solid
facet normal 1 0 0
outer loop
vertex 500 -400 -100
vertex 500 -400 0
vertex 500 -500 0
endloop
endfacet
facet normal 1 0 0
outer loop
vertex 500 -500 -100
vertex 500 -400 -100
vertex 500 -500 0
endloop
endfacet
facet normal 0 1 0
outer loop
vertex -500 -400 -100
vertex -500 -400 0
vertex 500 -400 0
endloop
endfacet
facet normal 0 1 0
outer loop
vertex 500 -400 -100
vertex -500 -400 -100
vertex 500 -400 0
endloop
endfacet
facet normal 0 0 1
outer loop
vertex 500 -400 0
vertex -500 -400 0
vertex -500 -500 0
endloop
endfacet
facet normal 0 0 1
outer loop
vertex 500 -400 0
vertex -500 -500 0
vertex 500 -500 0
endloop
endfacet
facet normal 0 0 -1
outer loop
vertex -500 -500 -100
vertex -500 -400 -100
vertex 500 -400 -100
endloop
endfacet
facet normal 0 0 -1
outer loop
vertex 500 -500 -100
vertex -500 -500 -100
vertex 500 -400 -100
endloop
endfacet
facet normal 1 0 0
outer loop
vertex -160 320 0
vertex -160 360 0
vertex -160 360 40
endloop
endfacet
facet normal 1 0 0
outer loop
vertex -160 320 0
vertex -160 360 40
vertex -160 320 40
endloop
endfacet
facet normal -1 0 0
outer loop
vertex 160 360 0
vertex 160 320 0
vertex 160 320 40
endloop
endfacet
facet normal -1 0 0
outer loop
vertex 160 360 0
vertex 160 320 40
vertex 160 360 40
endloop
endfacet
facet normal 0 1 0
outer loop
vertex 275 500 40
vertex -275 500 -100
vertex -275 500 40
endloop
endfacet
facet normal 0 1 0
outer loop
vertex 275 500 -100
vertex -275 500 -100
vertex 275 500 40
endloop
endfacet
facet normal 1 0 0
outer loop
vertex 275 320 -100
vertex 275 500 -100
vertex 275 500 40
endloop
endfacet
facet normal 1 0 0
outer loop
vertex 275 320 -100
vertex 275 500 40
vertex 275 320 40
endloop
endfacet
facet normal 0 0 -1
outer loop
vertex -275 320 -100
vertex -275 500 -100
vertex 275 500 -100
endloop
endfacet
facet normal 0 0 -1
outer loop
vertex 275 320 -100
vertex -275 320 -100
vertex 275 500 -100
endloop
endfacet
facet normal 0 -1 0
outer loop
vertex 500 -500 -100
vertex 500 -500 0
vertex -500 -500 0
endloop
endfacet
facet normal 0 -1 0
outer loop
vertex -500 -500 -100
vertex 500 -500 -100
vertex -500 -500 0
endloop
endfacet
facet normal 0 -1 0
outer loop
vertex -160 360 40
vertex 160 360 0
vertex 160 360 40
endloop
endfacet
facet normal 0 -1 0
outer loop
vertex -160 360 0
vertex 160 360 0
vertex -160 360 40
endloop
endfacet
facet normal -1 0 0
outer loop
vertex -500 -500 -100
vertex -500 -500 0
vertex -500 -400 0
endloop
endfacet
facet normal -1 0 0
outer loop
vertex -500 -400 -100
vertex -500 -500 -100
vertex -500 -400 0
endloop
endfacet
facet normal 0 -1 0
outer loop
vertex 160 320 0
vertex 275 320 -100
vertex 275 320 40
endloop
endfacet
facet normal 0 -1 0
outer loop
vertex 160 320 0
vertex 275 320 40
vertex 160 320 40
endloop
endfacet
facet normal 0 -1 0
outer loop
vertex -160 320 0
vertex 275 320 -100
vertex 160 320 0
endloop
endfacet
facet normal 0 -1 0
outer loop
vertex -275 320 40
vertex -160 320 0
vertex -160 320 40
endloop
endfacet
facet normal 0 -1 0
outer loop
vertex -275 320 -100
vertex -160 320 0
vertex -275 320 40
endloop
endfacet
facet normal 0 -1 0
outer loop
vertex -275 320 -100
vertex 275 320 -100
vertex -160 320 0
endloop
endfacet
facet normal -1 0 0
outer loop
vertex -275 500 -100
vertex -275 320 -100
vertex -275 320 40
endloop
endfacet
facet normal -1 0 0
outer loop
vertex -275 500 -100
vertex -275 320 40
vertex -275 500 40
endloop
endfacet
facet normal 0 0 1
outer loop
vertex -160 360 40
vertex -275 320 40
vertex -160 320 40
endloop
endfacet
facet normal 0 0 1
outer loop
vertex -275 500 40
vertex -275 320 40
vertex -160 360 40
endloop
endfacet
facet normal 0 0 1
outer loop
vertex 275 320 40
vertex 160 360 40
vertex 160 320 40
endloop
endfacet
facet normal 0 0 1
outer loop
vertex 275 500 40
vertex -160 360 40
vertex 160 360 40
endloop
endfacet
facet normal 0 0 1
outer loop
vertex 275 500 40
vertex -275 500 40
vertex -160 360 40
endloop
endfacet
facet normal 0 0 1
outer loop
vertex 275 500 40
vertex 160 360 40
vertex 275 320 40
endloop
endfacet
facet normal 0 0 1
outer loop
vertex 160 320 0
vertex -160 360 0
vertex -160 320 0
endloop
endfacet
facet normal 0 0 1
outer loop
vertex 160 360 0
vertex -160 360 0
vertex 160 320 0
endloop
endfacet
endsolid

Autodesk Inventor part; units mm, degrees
ref_plane "YZ Plane" through (0, 0, 0) normal (1, 0, 0) x (0, 1, 0)
ref_plane "XZ Plane" through (0, 0, 0) normal (0, 1, 0) x (-1, 0, 0)
ref_plane "XY Plane" through (0, 0, 0) normal (0, 0, 1) x (1, 0, 0)
sketch "Skizze3" plane through (0, 0, 0) normal (0, 0, 1) x (1, 0, 0)
  line L0 (-500, 500) -> (500, 500)
  line L1 (500, 500) -> (500, -500)
  line L2 (500, -500) -> (-500, -500)
  line L3 (-500, -500) -> (-500, 500)
  line L4 (-500, -400) -> (500, -400)
  line L5 (-275, 500) -> (275, 500)
  line L6 (275, 500) -> (275, 320)
  line L7 (275, 320) -> (-275, 320)
  line L8 (-275, 320) -> (-275, 500)
  arc A0 (-275, 320) -> (-400, -400) centre (1736.1, -400) ccw
  arc A1 (400, -400) -> (275, 320) centre (-1736.1, -400) ccw
  line L9 (-160, 320) -> (160, 320)
  line L10 (160, 320) -> (160, 360)
  line L11 (160, 360) -> (-160, 360)
  line L12 (-160, 360) -> (-160, 320)
  line L13 (-440, -450) -> (-140, -450)
  line L14 (90, -450) -> (440, -450)
  line L15 (-30, 360) -> (-30, 320)
  arc A2 (-440, -450) -> (-160, 320) centre (-1358.75, 320) ccw
  arc A3 (-140, -450) -> (-30, 320) centre (-2780, 320) ccw
  arc A4 (-30, 320) -> (90, -450) centre (2500.4167, 320) ccw
  arc A5 (160, 320) -> (440, -450) centre (1358.75, 320) ccw
  line L16 (-160, 360) -> (-440, -450) construction
  line L17 (-160, 360) -> (-146.1239, 400.1416) construction
  line L18 (-30, 360) -> (-146.1239, 400.1416) construction
  line L19 (-30, 360) -> (121.8543, 307.5071) construction
  line L20 (-440, -450) -> (-172.0218, -542.6344) construction
  line L21 (-140, -450) -> (-172.0218, -542.6344) construction
  line L22 (-140, -450) -> (121.8543, 307.5071) construction
  line L23 (-172.9217, 310.595) -> (139.7195, 418.6685) construction
  line L24 (139.7195, 418.6685) -> (440, -450) construction
  line L25 (440, -450) -> (127.3587, -558.0735) construction
  line L26 (127.3587, -558.0735) -> (-172.9217, 310.595) construction
  point P0 (0, 0)
  point P1 (-500, 0)
  point P2 (0, 500)
  point P3 (0, 320)
  point P4 (0, 360)
  dimension "d4" = 1000
  dimension "d5" = 1000
  dimension "d6" = 100
  dimension "d7" = 550
  dimension "d8" = 180
  dimension "d9" = 100
  dimension "d10" = 100
  dimension "d11" = 320
  dimension "d12" = 300
  dimension "d13" = 350
  dimension "d14" = 230
  dimension "d15" = 60
  dimension "d16" = -60
  dimension "d17" = 130
  dimension "d18" = 190
  dimension "d19" = 50
  dimension "d21" = 283.5374
  dimension "d22" = 40
  dimension "d23" = 140
  dimension "d24" = 899.502
  dimension "d25" = 919.1046
  dimension "d26" = 330.7937
extrude "Extrusion2" add sketch "Skizze3" against normal blind 100 contours L0 L6 L7 L10 L11 L12 L8 | L4 A2 L13 A3 A4 L14 A5 L1 L2 L3 | L4 A3 L13 A2 | L12 L11 L15 L7 | L7 L15 L11 L10 | A5 L14 A4 L4
extrude "Extrusion3" add sketch "Skizze3" along normal blind 40 contours L0 L6 L7 L10 L11 L12 L8
equation "\"d9\" = d6"
equation "\"d10\" = d6"
properties part number "UA-072-EinfassungKT"
